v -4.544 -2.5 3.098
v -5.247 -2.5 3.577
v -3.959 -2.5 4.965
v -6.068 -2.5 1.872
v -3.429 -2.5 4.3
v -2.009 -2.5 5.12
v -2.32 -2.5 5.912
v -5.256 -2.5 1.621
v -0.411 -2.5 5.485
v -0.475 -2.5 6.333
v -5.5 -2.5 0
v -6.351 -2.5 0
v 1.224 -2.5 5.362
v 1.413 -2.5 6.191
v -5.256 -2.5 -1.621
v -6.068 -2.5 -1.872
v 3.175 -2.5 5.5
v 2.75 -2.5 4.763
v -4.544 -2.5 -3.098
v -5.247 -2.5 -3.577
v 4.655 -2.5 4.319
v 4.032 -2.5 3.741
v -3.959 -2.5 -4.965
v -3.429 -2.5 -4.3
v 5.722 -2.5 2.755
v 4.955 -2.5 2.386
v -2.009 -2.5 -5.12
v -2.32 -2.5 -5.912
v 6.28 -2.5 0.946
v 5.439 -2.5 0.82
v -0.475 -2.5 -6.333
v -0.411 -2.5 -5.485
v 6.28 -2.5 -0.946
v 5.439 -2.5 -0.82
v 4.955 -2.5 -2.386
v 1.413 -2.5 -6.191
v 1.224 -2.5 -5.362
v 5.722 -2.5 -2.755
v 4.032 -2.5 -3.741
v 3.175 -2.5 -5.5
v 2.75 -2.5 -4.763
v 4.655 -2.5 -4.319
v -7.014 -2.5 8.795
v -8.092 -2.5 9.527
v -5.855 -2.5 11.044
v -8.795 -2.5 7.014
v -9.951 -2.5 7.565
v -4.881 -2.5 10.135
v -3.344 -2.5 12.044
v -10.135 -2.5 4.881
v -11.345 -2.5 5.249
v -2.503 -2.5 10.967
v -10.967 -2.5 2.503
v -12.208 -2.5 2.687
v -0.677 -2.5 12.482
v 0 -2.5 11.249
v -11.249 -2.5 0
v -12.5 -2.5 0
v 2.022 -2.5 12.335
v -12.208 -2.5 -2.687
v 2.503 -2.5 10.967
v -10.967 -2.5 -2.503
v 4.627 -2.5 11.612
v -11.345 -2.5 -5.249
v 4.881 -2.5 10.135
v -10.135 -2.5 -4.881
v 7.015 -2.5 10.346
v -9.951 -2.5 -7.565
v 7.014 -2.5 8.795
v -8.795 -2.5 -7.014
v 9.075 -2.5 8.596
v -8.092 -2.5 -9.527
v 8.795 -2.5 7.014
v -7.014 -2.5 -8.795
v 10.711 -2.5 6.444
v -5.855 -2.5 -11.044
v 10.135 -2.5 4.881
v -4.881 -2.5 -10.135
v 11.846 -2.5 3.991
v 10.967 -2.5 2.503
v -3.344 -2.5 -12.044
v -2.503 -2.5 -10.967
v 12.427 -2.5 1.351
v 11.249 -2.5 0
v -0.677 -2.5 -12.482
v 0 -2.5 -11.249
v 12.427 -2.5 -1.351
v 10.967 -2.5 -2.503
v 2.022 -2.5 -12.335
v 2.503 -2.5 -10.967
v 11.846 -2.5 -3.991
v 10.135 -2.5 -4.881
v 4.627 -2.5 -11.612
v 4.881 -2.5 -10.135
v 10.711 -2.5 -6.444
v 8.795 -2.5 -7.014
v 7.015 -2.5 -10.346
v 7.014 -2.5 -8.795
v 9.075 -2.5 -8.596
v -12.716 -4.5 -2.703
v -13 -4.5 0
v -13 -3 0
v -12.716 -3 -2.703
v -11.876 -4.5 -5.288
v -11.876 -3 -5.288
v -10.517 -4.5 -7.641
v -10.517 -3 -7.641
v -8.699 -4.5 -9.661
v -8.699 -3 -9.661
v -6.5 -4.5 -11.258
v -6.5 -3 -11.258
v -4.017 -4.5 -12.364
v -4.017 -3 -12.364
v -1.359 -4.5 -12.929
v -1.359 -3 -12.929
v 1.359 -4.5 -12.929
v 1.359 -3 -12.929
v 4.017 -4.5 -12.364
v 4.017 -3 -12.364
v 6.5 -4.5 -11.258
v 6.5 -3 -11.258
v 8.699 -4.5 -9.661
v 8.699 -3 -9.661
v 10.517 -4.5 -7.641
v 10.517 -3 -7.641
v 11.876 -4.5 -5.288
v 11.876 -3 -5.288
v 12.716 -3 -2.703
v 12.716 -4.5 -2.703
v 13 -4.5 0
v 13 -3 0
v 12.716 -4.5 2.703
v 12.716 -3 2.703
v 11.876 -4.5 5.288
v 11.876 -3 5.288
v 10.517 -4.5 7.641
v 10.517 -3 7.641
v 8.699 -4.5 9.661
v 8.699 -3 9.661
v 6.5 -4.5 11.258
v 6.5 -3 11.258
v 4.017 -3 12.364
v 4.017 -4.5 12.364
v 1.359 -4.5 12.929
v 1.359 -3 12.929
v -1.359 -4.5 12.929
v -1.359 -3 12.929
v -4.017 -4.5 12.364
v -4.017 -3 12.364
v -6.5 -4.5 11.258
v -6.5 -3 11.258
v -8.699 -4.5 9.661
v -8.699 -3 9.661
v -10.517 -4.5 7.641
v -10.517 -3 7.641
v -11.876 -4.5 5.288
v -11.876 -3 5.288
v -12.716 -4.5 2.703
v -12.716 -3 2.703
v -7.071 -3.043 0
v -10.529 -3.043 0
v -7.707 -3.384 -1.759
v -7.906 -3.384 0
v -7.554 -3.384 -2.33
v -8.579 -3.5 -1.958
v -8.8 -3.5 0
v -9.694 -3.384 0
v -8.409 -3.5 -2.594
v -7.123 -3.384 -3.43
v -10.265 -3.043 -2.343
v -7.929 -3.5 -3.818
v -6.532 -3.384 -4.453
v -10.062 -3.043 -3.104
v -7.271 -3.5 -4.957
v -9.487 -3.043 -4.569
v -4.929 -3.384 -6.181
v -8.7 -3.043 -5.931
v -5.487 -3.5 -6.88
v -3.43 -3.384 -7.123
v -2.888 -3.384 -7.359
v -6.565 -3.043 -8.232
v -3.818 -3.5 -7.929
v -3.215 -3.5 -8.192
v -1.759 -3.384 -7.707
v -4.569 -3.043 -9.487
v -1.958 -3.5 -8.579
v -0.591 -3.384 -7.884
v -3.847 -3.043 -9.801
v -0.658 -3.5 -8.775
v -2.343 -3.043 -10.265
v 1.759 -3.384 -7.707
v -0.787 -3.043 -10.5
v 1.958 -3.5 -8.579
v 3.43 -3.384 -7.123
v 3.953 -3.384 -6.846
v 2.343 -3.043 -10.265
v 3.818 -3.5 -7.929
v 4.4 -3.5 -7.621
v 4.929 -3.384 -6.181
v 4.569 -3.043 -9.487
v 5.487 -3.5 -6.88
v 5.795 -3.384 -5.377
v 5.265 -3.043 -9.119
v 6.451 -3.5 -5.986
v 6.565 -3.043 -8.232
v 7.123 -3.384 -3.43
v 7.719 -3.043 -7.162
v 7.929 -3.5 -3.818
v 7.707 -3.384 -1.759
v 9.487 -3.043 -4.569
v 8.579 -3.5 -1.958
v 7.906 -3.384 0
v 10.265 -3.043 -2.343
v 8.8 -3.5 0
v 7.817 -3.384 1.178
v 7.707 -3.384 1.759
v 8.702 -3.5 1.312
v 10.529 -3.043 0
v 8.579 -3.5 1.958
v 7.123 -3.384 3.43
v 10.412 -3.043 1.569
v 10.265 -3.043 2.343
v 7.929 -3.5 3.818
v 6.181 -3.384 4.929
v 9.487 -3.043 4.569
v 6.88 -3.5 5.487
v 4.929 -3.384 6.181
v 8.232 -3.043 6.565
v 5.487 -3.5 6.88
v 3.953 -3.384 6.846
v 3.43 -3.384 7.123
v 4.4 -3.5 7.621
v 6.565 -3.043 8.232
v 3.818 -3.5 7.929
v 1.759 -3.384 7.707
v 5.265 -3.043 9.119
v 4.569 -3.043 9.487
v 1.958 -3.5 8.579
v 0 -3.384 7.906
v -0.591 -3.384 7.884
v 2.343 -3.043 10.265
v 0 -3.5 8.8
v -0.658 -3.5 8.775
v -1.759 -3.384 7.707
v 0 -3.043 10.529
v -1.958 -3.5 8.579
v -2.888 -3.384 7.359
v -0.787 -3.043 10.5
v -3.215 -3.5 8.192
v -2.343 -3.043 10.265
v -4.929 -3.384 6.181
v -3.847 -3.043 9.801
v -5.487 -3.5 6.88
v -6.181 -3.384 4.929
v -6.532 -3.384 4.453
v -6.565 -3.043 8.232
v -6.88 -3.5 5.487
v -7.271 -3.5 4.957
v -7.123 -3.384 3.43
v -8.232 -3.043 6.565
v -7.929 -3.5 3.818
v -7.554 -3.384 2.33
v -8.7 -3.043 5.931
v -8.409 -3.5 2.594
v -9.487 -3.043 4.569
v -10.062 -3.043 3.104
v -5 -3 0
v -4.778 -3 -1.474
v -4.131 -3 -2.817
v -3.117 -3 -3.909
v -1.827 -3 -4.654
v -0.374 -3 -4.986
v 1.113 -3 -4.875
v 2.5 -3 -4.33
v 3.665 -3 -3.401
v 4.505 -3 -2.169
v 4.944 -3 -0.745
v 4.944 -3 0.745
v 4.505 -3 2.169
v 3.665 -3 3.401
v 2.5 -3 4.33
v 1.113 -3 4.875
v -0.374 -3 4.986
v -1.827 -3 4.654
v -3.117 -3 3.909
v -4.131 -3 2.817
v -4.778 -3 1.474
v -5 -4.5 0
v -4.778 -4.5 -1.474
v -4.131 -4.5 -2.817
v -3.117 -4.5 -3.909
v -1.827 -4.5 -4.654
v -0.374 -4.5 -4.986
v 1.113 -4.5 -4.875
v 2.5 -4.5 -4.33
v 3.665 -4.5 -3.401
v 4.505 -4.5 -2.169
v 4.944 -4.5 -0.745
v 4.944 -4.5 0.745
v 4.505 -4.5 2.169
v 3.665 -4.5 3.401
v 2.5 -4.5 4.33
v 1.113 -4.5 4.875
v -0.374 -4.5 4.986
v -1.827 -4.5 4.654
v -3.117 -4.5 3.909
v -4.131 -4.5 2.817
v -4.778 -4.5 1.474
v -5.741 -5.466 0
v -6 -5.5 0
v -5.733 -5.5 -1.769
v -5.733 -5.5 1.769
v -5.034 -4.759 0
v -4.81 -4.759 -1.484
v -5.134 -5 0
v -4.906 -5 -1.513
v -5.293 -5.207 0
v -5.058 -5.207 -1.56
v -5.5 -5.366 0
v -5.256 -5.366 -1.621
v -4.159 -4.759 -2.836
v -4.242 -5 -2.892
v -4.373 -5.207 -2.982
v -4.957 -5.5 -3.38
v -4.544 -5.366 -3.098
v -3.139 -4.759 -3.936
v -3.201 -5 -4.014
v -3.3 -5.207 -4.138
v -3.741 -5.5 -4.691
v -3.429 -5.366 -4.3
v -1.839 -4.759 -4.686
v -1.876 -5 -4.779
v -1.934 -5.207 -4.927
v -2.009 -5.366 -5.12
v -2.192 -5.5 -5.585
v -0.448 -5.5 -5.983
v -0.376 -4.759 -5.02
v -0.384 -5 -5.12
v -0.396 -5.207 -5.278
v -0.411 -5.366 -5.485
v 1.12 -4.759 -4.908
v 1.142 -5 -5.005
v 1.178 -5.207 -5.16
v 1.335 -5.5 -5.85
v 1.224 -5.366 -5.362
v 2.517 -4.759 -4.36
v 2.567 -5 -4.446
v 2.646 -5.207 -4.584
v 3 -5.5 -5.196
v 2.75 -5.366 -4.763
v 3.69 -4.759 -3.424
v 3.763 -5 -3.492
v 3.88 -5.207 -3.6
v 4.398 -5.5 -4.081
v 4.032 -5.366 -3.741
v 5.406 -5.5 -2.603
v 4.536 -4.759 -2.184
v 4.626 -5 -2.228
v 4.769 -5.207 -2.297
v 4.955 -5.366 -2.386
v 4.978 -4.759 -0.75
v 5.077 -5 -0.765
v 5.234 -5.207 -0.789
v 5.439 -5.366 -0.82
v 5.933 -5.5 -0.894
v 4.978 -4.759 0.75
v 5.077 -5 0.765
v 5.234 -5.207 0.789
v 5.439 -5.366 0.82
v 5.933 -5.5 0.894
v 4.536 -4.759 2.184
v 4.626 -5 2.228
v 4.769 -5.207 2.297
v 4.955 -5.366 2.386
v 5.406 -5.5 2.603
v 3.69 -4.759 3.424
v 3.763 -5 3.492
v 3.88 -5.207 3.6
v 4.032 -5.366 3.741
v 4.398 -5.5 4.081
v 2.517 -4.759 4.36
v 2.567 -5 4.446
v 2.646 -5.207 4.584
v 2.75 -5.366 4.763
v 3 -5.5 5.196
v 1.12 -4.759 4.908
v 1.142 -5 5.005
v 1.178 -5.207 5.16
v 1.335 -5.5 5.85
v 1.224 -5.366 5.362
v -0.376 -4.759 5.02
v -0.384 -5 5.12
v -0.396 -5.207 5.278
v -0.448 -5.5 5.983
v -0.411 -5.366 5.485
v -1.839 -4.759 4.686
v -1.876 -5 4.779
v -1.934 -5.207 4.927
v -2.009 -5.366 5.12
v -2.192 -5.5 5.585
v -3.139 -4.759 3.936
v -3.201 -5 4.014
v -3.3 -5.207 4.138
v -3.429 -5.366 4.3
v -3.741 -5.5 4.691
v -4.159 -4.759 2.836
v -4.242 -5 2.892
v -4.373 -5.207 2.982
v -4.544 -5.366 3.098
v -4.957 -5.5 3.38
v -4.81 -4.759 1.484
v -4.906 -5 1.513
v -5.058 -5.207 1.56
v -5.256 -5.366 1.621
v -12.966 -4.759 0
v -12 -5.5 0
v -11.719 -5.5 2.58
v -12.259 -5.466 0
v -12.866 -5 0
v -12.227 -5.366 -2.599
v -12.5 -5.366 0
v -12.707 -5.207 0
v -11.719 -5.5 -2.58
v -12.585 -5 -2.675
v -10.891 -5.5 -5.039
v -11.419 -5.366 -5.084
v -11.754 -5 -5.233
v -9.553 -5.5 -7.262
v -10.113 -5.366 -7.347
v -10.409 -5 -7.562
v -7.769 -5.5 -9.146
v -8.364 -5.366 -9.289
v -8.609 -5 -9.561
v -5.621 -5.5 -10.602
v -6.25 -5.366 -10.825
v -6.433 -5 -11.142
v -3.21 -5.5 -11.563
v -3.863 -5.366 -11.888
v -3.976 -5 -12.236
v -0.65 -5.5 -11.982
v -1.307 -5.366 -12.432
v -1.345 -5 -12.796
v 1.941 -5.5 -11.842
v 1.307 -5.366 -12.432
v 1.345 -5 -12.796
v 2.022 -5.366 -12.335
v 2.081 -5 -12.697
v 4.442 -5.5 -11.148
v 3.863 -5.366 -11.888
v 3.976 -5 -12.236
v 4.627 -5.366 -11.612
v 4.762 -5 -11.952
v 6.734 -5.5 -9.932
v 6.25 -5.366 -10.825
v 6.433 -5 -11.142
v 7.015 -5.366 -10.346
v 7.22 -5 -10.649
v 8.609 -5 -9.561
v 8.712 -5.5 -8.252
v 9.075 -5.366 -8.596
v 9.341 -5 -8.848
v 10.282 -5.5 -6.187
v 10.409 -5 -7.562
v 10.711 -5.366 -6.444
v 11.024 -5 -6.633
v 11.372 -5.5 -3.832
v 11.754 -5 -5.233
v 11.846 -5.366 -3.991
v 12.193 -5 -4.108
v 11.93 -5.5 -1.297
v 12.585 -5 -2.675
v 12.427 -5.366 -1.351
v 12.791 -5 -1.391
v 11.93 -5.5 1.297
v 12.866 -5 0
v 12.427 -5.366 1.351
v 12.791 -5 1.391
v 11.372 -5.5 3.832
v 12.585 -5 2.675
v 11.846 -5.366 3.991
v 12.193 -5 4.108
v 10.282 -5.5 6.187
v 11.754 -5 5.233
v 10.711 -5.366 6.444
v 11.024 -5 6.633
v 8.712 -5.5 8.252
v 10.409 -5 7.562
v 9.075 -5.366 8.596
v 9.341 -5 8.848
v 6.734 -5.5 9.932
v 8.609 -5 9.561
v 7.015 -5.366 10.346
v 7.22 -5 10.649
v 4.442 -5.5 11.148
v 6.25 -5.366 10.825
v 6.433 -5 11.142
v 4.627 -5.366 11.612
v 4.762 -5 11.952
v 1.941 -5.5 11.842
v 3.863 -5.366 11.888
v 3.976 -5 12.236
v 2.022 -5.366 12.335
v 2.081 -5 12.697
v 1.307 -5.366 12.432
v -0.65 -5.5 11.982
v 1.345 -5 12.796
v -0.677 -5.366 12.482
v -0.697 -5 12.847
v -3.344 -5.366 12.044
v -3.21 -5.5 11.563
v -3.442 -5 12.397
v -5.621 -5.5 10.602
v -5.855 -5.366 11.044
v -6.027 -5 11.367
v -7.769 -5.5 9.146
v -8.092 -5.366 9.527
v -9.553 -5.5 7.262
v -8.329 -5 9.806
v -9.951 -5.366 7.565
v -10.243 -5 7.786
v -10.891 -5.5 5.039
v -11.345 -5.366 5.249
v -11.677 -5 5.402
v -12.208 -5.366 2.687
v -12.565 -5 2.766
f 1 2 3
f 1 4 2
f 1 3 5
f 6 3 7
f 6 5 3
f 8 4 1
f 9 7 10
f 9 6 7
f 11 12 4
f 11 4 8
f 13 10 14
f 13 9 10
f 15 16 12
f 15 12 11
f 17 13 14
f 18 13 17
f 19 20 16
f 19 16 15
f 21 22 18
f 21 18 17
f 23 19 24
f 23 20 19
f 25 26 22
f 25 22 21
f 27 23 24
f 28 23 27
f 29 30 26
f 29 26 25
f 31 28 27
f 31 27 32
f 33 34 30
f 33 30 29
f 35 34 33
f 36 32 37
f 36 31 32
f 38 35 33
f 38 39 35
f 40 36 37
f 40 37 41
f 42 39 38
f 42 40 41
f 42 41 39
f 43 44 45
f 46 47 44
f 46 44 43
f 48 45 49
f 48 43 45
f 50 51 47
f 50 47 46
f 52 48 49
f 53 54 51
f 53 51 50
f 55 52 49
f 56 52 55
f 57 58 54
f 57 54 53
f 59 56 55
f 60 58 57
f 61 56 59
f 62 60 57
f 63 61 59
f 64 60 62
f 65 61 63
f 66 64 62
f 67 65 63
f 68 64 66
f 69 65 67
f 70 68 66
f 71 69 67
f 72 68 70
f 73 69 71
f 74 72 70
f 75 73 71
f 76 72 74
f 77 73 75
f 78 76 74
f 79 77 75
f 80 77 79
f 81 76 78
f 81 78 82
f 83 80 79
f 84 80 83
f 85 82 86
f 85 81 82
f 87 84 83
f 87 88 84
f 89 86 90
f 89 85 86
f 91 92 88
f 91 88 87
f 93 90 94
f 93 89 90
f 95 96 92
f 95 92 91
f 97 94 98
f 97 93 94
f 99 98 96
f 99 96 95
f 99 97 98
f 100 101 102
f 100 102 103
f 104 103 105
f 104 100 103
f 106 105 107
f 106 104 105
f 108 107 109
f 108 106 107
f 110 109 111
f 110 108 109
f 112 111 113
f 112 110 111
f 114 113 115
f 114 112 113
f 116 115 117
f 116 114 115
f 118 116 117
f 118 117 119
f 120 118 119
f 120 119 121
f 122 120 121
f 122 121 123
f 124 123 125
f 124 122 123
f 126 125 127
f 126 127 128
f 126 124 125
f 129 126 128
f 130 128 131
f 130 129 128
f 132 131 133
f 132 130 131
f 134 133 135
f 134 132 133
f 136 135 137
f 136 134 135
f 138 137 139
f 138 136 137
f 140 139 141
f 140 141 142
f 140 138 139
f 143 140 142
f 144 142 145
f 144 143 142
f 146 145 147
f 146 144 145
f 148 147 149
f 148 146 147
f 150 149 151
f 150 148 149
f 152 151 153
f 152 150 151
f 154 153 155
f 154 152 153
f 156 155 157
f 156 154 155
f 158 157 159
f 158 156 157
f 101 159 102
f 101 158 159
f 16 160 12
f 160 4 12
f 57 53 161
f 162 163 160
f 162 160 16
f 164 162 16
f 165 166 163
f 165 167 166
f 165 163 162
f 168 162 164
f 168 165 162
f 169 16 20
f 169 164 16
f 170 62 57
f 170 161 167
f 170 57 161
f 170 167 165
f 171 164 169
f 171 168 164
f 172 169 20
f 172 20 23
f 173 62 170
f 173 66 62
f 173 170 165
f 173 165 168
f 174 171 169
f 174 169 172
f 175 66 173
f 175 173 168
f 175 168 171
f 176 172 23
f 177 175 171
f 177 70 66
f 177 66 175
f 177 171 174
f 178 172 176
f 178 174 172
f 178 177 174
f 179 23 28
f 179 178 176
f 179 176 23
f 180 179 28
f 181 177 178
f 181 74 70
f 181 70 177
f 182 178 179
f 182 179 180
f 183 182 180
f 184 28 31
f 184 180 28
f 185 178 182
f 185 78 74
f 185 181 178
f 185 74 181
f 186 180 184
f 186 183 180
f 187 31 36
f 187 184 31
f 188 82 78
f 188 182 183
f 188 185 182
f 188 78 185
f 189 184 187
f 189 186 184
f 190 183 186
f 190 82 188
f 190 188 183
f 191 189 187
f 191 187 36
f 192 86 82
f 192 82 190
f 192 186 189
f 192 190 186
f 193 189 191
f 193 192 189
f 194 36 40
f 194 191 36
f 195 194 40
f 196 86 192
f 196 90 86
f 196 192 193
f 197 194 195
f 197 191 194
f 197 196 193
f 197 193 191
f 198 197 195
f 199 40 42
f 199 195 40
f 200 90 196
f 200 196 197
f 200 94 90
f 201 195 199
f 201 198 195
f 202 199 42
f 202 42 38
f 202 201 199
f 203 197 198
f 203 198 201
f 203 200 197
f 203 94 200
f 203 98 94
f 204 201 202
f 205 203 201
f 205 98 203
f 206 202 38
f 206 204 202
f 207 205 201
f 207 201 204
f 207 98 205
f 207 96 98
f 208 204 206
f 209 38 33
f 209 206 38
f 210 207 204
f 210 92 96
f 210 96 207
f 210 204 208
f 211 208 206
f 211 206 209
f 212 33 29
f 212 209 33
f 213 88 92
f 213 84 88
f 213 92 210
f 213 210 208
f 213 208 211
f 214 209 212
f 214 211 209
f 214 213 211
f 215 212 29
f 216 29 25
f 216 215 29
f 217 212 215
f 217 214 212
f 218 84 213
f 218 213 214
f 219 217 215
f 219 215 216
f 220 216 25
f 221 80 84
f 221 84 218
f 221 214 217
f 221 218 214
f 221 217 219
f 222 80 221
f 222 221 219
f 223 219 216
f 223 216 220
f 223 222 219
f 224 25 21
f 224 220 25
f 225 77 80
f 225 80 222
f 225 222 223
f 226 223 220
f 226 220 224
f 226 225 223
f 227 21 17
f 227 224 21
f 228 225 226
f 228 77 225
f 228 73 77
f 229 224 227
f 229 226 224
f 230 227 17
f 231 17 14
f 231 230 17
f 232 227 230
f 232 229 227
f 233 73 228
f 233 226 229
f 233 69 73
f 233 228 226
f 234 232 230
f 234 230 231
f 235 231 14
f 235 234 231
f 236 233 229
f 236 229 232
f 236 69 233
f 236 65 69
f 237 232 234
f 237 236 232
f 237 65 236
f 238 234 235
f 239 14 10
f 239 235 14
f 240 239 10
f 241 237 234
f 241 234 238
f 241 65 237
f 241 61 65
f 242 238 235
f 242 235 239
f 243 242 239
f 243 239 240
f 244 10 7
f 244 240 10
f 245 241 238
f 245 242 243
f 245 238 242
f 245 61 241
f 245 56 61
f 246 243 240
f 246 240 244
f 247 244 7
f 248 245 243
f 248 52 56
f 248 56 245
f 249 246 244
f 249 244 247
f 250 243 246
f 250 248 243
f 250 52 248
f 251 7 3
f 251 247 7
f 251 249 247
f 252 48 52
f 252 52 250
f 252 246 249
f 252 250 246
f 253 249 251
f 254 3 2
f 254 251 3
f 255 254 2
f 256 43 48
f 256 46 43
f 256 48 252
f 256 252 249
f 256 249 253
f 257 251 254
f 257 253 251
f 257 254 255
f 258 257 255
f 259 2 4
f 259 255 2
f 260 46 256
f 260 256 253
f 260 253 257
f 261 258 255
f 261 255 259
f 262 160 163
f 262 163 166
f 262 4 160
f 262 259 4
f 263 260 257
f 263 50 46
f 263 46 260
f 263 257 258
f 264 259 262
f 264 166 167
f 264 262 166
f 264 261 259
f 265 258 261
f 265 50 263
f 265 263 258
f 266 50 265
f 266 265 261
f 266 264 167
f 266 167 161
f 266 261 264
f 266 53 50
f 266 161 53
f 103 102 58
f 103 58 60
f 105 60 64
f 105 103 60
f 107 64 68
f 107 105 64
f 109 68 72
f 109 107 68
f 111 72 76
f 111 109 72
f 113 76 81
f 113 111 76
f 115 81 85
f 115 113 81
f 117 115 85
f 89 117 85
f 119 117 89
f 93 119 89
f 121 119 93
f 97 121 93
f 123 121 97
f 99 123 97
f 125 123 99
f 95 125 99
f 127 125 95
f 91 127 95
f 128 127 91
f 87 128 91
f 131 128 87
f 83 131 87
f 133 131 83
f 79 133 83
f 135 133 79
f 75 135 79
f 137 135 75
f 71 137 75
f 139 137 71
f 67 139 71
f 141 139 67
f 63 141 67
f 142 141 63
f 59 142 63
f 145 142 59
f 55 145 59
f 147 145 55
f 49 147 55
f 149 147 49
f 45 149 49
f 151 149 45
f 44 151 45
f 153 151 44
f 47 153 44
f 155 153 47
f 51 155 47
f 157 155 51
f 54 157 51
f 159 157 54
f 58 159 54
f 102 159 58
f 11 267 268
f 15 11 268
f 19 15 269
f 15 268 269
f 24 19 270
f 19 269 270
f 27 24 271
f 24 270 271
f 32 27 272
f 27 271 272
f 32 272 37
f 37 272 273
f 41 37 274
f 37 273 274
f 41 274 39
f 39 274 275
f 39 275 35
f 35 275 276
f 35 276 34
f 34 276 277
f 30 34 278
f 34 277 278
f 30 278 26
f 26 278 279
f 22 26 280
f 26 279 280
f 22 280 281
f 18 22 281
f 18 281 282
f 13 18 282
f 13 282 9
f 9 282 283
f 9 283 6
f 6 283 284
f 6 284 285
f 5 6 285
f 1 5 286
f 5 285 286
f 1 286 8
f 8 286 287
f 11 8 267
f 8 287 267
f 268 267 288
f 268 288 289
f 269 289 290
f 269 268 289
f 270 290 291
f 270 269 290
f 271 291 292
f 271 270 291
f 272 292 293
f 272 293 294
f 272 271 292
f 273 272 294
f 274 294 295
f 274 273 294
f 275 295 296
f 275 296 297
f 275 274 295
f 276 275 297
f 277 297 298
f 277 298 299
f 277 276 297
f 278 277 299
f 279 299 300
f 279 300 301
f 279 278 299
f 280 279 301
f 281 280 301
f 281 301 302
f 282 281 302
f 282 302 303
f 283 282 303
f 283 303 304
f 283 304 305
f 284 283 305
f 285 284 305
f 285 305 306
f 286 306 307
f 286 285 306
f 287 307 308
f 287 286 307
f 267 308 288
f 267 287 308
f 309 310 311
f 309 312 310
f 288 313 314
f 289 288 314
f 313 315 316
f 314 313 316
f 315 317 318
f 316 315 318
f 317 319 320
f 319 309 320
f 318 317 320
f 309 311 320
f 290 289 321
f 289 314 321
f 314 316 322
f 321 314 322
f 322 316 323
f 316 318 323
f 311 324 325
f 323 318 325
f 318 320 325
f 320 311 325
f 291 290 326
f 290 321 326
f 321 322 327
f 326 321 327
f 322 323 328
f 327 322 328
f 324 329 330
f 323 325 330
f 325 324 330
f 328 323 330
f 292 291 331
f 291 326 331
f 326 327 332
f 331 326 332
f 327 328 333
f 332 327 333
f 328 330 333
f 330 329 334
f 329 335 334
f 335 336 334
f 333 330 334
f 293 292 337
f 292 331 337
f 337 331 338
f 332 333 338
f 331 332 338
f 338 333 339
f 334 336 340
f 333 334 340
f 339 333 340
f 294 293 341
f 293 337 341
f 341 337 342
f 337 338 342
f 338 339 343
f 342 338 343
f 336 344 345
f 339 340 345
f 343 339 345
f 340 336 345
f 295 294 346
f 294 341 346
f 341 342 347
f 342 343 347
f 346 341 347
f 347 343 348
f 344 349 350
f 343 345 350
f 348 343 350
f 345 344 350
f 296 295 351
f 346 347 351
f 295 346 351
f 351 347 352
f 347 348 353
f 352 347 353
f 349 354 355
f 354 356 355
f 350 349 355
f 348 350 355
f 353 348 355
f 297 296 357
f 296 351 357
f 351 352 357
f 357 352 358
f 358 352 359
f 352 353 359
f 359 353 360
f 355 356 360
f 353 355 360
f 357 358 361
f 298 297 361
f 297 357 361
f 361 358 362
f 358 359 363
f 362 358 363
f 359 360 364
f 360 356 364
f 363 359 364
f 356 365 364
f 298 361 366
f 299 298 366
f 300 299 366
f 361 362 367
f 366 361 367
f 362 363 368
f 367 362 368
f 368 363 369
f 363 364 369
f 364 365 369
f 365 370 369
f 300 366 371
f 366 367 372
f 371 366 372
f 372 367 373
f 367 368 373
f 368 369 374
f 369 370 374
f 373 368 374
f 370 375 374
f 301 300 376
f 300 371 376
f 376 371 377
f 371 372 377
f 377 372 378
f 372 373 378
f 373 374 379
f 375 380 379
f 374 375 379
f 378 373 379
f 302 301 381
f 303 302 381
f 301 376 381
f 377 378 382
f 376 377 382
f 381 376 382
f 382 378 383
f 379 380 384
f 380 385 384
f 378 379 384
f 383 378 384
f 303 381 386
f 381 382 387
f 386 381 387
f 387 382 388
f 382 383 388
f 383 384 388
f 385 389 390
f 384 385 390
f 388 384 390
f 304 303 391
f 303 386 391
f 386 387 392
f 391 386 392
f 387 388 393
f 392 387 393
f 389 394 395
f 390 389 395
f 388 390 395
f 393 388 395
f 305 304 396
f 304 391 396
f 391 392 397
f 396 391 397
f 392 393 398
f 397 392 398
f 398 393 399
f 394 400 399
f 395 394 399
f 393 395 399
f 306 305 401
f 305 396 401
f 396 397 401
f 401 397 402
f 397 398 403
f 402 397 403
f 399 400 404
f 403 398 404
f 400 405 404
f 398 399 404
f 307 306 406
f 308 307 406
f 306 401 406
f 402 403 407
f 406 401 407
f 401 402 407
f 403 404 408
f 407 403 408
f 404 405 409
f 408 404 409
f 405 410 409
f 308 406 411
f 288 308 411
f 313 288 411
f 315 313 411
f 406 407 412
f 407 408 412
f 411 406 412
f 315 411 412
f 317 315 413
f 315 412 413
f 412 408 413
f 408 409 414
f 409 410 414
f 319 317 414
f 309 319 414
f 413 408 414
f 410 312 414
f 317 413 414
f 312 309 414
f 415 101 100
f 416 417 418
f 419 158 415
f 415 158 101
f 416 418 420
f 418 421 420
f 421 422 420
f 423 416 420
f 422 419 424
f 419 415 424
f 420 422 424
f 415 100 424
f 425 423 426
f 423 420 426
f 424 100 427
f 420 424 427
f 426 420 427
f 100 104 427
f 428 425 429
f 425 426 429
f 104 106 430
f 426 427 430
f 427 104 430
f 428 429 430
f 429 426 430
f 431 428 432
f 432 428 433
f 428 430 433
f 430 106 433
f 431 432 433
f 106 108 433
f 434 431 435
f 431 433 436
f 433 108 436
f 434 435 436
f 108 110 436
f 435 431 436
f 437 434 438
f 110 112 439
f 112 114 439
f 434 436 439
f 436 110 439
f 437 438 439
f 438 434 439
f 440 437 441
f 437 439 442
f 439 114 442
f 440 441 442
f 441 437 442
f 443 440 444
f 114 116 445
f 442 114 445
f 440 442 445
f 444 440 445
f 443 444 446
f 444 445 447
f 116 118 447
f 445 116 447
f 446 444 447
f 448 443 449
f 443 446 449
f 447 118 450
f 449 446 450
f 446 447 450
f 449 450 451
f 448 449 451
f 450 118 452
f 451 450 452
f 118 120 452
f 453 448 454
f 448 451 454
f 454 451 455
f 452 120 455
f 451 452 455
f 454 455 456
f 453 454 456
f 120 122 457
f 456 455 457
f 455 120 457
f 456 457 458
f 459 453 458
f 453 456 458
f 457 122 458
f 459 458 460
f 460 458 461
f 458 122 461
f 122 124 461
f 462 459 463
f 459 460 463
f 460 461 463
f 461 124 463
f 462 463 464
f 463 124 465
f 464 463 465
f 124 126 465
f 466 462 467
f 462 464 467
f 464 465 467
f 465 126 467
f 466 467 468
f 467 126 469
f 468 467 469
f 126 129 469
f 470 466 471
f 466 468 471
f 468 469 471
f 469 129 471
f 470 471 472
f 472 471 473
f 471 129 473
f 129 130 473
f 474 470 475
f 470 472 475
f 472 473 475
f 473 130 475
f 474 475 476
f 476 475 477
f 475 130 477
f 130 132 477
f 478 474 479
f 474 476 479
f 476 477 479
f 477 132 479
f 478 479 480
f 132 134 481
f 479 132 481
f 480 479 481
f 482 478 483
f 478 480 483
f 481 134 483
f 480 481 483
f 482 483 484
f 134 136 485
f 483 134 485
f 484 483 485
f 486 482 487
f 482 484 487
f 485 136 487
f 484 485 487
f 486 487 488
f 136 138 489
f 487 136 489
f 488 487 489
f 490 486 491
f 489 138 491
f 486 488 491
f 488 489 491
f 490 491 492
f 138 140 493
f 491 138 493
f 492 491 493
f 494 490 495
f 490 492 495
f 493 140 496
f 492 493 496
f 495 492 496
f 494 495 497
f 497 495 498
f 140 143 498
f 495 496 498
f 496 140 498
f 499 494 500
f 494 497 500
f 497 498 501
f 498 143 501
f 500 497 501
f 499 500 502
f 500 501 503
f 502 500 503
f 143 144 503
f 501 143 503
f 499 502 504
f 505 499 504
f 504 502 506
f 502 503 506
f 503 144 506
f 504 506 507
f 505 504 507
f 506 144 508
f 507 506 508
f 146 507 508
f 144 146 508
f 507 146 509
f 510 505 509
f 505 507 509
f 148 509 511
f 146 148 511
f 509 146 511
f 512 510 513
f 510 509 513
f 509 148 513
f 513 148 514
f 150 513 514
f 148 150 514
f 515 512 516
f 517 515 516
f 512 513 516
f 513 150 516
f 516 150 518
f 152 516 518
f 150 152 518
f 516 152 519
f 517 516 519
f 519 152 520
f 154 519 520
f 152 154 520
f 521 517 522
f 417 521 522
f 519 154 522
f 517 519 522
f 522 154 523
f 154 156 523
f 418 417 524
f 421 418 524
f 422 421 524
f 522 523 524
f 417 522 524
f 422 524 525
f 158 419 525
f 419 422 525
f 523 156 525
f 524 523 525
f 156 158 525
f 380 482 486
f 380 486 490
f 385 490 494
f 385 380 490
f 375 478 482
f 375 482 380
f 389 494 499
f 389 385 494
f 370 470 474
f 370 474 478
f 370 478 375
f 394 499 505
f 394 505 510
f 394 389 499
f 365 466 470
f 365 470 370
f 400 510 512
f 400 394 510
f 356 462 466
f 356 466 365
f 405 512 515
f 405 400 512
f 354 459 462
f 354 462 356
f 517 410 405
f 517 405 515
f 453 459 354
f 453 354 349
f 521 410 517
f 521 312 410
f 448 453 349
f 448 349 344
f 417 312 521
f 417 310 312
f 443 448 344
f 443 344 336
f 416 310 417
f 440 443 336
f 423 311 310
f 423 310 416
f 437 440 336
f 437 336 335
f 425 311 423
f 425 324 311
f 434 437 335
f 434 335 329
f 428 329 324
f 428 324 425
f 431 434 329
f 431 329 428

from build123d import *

# Parameters (mm, degrees)
CHAMFER1_SIZE = 0.5
FILLET2_R     = 1


with BuildPart() as part:
    # Sketch1 → Revolve1 (revolve)
    with BuildSketch(Plane.XY, mode=Mode.PRIVATE) as revolve1_sk:
        with BuildLine():
            Line((5, -2.5), (6.350510257, -2.5))
            ThreePointArc((6.350510257, -2.5), (8.8, -3.5), (11.249489743, -2.5))
            Line((11.249489743, -2.5), (13, -2.5))
            Line((13, -2.5), (13, -5.5))
            Line((13, -5.5), (5, -5.5))
            Line((5, -5.5), (5, -2.5))
        make_face()
    revolve(revolve1_sk.sketch.rotate(Axis((0, 5.5, 0), (0, -1, 0)), 180), axis=Axis((0, 5.5, 0), (0, -1, 0)))

    # Chamfer1
    chamfer1_edges = [part.edges().sort_by_distance(p)[0] for p in [
        (5, -2.5, 0),
        (13, -2.5, 0),
    ]]
    chamfer(chamfer1_edges, length=CHAMFER1_SIZE)

    # Fillet2
    fillet2_edges = [part.edges().sort_by_distance(p)[0] for p in [
        (13, -5.5, 0),
        (5, -5.5, 0),
    ]]
    fillet(fillet2_edges, radius=FILLET2_R)


solid = part.part
